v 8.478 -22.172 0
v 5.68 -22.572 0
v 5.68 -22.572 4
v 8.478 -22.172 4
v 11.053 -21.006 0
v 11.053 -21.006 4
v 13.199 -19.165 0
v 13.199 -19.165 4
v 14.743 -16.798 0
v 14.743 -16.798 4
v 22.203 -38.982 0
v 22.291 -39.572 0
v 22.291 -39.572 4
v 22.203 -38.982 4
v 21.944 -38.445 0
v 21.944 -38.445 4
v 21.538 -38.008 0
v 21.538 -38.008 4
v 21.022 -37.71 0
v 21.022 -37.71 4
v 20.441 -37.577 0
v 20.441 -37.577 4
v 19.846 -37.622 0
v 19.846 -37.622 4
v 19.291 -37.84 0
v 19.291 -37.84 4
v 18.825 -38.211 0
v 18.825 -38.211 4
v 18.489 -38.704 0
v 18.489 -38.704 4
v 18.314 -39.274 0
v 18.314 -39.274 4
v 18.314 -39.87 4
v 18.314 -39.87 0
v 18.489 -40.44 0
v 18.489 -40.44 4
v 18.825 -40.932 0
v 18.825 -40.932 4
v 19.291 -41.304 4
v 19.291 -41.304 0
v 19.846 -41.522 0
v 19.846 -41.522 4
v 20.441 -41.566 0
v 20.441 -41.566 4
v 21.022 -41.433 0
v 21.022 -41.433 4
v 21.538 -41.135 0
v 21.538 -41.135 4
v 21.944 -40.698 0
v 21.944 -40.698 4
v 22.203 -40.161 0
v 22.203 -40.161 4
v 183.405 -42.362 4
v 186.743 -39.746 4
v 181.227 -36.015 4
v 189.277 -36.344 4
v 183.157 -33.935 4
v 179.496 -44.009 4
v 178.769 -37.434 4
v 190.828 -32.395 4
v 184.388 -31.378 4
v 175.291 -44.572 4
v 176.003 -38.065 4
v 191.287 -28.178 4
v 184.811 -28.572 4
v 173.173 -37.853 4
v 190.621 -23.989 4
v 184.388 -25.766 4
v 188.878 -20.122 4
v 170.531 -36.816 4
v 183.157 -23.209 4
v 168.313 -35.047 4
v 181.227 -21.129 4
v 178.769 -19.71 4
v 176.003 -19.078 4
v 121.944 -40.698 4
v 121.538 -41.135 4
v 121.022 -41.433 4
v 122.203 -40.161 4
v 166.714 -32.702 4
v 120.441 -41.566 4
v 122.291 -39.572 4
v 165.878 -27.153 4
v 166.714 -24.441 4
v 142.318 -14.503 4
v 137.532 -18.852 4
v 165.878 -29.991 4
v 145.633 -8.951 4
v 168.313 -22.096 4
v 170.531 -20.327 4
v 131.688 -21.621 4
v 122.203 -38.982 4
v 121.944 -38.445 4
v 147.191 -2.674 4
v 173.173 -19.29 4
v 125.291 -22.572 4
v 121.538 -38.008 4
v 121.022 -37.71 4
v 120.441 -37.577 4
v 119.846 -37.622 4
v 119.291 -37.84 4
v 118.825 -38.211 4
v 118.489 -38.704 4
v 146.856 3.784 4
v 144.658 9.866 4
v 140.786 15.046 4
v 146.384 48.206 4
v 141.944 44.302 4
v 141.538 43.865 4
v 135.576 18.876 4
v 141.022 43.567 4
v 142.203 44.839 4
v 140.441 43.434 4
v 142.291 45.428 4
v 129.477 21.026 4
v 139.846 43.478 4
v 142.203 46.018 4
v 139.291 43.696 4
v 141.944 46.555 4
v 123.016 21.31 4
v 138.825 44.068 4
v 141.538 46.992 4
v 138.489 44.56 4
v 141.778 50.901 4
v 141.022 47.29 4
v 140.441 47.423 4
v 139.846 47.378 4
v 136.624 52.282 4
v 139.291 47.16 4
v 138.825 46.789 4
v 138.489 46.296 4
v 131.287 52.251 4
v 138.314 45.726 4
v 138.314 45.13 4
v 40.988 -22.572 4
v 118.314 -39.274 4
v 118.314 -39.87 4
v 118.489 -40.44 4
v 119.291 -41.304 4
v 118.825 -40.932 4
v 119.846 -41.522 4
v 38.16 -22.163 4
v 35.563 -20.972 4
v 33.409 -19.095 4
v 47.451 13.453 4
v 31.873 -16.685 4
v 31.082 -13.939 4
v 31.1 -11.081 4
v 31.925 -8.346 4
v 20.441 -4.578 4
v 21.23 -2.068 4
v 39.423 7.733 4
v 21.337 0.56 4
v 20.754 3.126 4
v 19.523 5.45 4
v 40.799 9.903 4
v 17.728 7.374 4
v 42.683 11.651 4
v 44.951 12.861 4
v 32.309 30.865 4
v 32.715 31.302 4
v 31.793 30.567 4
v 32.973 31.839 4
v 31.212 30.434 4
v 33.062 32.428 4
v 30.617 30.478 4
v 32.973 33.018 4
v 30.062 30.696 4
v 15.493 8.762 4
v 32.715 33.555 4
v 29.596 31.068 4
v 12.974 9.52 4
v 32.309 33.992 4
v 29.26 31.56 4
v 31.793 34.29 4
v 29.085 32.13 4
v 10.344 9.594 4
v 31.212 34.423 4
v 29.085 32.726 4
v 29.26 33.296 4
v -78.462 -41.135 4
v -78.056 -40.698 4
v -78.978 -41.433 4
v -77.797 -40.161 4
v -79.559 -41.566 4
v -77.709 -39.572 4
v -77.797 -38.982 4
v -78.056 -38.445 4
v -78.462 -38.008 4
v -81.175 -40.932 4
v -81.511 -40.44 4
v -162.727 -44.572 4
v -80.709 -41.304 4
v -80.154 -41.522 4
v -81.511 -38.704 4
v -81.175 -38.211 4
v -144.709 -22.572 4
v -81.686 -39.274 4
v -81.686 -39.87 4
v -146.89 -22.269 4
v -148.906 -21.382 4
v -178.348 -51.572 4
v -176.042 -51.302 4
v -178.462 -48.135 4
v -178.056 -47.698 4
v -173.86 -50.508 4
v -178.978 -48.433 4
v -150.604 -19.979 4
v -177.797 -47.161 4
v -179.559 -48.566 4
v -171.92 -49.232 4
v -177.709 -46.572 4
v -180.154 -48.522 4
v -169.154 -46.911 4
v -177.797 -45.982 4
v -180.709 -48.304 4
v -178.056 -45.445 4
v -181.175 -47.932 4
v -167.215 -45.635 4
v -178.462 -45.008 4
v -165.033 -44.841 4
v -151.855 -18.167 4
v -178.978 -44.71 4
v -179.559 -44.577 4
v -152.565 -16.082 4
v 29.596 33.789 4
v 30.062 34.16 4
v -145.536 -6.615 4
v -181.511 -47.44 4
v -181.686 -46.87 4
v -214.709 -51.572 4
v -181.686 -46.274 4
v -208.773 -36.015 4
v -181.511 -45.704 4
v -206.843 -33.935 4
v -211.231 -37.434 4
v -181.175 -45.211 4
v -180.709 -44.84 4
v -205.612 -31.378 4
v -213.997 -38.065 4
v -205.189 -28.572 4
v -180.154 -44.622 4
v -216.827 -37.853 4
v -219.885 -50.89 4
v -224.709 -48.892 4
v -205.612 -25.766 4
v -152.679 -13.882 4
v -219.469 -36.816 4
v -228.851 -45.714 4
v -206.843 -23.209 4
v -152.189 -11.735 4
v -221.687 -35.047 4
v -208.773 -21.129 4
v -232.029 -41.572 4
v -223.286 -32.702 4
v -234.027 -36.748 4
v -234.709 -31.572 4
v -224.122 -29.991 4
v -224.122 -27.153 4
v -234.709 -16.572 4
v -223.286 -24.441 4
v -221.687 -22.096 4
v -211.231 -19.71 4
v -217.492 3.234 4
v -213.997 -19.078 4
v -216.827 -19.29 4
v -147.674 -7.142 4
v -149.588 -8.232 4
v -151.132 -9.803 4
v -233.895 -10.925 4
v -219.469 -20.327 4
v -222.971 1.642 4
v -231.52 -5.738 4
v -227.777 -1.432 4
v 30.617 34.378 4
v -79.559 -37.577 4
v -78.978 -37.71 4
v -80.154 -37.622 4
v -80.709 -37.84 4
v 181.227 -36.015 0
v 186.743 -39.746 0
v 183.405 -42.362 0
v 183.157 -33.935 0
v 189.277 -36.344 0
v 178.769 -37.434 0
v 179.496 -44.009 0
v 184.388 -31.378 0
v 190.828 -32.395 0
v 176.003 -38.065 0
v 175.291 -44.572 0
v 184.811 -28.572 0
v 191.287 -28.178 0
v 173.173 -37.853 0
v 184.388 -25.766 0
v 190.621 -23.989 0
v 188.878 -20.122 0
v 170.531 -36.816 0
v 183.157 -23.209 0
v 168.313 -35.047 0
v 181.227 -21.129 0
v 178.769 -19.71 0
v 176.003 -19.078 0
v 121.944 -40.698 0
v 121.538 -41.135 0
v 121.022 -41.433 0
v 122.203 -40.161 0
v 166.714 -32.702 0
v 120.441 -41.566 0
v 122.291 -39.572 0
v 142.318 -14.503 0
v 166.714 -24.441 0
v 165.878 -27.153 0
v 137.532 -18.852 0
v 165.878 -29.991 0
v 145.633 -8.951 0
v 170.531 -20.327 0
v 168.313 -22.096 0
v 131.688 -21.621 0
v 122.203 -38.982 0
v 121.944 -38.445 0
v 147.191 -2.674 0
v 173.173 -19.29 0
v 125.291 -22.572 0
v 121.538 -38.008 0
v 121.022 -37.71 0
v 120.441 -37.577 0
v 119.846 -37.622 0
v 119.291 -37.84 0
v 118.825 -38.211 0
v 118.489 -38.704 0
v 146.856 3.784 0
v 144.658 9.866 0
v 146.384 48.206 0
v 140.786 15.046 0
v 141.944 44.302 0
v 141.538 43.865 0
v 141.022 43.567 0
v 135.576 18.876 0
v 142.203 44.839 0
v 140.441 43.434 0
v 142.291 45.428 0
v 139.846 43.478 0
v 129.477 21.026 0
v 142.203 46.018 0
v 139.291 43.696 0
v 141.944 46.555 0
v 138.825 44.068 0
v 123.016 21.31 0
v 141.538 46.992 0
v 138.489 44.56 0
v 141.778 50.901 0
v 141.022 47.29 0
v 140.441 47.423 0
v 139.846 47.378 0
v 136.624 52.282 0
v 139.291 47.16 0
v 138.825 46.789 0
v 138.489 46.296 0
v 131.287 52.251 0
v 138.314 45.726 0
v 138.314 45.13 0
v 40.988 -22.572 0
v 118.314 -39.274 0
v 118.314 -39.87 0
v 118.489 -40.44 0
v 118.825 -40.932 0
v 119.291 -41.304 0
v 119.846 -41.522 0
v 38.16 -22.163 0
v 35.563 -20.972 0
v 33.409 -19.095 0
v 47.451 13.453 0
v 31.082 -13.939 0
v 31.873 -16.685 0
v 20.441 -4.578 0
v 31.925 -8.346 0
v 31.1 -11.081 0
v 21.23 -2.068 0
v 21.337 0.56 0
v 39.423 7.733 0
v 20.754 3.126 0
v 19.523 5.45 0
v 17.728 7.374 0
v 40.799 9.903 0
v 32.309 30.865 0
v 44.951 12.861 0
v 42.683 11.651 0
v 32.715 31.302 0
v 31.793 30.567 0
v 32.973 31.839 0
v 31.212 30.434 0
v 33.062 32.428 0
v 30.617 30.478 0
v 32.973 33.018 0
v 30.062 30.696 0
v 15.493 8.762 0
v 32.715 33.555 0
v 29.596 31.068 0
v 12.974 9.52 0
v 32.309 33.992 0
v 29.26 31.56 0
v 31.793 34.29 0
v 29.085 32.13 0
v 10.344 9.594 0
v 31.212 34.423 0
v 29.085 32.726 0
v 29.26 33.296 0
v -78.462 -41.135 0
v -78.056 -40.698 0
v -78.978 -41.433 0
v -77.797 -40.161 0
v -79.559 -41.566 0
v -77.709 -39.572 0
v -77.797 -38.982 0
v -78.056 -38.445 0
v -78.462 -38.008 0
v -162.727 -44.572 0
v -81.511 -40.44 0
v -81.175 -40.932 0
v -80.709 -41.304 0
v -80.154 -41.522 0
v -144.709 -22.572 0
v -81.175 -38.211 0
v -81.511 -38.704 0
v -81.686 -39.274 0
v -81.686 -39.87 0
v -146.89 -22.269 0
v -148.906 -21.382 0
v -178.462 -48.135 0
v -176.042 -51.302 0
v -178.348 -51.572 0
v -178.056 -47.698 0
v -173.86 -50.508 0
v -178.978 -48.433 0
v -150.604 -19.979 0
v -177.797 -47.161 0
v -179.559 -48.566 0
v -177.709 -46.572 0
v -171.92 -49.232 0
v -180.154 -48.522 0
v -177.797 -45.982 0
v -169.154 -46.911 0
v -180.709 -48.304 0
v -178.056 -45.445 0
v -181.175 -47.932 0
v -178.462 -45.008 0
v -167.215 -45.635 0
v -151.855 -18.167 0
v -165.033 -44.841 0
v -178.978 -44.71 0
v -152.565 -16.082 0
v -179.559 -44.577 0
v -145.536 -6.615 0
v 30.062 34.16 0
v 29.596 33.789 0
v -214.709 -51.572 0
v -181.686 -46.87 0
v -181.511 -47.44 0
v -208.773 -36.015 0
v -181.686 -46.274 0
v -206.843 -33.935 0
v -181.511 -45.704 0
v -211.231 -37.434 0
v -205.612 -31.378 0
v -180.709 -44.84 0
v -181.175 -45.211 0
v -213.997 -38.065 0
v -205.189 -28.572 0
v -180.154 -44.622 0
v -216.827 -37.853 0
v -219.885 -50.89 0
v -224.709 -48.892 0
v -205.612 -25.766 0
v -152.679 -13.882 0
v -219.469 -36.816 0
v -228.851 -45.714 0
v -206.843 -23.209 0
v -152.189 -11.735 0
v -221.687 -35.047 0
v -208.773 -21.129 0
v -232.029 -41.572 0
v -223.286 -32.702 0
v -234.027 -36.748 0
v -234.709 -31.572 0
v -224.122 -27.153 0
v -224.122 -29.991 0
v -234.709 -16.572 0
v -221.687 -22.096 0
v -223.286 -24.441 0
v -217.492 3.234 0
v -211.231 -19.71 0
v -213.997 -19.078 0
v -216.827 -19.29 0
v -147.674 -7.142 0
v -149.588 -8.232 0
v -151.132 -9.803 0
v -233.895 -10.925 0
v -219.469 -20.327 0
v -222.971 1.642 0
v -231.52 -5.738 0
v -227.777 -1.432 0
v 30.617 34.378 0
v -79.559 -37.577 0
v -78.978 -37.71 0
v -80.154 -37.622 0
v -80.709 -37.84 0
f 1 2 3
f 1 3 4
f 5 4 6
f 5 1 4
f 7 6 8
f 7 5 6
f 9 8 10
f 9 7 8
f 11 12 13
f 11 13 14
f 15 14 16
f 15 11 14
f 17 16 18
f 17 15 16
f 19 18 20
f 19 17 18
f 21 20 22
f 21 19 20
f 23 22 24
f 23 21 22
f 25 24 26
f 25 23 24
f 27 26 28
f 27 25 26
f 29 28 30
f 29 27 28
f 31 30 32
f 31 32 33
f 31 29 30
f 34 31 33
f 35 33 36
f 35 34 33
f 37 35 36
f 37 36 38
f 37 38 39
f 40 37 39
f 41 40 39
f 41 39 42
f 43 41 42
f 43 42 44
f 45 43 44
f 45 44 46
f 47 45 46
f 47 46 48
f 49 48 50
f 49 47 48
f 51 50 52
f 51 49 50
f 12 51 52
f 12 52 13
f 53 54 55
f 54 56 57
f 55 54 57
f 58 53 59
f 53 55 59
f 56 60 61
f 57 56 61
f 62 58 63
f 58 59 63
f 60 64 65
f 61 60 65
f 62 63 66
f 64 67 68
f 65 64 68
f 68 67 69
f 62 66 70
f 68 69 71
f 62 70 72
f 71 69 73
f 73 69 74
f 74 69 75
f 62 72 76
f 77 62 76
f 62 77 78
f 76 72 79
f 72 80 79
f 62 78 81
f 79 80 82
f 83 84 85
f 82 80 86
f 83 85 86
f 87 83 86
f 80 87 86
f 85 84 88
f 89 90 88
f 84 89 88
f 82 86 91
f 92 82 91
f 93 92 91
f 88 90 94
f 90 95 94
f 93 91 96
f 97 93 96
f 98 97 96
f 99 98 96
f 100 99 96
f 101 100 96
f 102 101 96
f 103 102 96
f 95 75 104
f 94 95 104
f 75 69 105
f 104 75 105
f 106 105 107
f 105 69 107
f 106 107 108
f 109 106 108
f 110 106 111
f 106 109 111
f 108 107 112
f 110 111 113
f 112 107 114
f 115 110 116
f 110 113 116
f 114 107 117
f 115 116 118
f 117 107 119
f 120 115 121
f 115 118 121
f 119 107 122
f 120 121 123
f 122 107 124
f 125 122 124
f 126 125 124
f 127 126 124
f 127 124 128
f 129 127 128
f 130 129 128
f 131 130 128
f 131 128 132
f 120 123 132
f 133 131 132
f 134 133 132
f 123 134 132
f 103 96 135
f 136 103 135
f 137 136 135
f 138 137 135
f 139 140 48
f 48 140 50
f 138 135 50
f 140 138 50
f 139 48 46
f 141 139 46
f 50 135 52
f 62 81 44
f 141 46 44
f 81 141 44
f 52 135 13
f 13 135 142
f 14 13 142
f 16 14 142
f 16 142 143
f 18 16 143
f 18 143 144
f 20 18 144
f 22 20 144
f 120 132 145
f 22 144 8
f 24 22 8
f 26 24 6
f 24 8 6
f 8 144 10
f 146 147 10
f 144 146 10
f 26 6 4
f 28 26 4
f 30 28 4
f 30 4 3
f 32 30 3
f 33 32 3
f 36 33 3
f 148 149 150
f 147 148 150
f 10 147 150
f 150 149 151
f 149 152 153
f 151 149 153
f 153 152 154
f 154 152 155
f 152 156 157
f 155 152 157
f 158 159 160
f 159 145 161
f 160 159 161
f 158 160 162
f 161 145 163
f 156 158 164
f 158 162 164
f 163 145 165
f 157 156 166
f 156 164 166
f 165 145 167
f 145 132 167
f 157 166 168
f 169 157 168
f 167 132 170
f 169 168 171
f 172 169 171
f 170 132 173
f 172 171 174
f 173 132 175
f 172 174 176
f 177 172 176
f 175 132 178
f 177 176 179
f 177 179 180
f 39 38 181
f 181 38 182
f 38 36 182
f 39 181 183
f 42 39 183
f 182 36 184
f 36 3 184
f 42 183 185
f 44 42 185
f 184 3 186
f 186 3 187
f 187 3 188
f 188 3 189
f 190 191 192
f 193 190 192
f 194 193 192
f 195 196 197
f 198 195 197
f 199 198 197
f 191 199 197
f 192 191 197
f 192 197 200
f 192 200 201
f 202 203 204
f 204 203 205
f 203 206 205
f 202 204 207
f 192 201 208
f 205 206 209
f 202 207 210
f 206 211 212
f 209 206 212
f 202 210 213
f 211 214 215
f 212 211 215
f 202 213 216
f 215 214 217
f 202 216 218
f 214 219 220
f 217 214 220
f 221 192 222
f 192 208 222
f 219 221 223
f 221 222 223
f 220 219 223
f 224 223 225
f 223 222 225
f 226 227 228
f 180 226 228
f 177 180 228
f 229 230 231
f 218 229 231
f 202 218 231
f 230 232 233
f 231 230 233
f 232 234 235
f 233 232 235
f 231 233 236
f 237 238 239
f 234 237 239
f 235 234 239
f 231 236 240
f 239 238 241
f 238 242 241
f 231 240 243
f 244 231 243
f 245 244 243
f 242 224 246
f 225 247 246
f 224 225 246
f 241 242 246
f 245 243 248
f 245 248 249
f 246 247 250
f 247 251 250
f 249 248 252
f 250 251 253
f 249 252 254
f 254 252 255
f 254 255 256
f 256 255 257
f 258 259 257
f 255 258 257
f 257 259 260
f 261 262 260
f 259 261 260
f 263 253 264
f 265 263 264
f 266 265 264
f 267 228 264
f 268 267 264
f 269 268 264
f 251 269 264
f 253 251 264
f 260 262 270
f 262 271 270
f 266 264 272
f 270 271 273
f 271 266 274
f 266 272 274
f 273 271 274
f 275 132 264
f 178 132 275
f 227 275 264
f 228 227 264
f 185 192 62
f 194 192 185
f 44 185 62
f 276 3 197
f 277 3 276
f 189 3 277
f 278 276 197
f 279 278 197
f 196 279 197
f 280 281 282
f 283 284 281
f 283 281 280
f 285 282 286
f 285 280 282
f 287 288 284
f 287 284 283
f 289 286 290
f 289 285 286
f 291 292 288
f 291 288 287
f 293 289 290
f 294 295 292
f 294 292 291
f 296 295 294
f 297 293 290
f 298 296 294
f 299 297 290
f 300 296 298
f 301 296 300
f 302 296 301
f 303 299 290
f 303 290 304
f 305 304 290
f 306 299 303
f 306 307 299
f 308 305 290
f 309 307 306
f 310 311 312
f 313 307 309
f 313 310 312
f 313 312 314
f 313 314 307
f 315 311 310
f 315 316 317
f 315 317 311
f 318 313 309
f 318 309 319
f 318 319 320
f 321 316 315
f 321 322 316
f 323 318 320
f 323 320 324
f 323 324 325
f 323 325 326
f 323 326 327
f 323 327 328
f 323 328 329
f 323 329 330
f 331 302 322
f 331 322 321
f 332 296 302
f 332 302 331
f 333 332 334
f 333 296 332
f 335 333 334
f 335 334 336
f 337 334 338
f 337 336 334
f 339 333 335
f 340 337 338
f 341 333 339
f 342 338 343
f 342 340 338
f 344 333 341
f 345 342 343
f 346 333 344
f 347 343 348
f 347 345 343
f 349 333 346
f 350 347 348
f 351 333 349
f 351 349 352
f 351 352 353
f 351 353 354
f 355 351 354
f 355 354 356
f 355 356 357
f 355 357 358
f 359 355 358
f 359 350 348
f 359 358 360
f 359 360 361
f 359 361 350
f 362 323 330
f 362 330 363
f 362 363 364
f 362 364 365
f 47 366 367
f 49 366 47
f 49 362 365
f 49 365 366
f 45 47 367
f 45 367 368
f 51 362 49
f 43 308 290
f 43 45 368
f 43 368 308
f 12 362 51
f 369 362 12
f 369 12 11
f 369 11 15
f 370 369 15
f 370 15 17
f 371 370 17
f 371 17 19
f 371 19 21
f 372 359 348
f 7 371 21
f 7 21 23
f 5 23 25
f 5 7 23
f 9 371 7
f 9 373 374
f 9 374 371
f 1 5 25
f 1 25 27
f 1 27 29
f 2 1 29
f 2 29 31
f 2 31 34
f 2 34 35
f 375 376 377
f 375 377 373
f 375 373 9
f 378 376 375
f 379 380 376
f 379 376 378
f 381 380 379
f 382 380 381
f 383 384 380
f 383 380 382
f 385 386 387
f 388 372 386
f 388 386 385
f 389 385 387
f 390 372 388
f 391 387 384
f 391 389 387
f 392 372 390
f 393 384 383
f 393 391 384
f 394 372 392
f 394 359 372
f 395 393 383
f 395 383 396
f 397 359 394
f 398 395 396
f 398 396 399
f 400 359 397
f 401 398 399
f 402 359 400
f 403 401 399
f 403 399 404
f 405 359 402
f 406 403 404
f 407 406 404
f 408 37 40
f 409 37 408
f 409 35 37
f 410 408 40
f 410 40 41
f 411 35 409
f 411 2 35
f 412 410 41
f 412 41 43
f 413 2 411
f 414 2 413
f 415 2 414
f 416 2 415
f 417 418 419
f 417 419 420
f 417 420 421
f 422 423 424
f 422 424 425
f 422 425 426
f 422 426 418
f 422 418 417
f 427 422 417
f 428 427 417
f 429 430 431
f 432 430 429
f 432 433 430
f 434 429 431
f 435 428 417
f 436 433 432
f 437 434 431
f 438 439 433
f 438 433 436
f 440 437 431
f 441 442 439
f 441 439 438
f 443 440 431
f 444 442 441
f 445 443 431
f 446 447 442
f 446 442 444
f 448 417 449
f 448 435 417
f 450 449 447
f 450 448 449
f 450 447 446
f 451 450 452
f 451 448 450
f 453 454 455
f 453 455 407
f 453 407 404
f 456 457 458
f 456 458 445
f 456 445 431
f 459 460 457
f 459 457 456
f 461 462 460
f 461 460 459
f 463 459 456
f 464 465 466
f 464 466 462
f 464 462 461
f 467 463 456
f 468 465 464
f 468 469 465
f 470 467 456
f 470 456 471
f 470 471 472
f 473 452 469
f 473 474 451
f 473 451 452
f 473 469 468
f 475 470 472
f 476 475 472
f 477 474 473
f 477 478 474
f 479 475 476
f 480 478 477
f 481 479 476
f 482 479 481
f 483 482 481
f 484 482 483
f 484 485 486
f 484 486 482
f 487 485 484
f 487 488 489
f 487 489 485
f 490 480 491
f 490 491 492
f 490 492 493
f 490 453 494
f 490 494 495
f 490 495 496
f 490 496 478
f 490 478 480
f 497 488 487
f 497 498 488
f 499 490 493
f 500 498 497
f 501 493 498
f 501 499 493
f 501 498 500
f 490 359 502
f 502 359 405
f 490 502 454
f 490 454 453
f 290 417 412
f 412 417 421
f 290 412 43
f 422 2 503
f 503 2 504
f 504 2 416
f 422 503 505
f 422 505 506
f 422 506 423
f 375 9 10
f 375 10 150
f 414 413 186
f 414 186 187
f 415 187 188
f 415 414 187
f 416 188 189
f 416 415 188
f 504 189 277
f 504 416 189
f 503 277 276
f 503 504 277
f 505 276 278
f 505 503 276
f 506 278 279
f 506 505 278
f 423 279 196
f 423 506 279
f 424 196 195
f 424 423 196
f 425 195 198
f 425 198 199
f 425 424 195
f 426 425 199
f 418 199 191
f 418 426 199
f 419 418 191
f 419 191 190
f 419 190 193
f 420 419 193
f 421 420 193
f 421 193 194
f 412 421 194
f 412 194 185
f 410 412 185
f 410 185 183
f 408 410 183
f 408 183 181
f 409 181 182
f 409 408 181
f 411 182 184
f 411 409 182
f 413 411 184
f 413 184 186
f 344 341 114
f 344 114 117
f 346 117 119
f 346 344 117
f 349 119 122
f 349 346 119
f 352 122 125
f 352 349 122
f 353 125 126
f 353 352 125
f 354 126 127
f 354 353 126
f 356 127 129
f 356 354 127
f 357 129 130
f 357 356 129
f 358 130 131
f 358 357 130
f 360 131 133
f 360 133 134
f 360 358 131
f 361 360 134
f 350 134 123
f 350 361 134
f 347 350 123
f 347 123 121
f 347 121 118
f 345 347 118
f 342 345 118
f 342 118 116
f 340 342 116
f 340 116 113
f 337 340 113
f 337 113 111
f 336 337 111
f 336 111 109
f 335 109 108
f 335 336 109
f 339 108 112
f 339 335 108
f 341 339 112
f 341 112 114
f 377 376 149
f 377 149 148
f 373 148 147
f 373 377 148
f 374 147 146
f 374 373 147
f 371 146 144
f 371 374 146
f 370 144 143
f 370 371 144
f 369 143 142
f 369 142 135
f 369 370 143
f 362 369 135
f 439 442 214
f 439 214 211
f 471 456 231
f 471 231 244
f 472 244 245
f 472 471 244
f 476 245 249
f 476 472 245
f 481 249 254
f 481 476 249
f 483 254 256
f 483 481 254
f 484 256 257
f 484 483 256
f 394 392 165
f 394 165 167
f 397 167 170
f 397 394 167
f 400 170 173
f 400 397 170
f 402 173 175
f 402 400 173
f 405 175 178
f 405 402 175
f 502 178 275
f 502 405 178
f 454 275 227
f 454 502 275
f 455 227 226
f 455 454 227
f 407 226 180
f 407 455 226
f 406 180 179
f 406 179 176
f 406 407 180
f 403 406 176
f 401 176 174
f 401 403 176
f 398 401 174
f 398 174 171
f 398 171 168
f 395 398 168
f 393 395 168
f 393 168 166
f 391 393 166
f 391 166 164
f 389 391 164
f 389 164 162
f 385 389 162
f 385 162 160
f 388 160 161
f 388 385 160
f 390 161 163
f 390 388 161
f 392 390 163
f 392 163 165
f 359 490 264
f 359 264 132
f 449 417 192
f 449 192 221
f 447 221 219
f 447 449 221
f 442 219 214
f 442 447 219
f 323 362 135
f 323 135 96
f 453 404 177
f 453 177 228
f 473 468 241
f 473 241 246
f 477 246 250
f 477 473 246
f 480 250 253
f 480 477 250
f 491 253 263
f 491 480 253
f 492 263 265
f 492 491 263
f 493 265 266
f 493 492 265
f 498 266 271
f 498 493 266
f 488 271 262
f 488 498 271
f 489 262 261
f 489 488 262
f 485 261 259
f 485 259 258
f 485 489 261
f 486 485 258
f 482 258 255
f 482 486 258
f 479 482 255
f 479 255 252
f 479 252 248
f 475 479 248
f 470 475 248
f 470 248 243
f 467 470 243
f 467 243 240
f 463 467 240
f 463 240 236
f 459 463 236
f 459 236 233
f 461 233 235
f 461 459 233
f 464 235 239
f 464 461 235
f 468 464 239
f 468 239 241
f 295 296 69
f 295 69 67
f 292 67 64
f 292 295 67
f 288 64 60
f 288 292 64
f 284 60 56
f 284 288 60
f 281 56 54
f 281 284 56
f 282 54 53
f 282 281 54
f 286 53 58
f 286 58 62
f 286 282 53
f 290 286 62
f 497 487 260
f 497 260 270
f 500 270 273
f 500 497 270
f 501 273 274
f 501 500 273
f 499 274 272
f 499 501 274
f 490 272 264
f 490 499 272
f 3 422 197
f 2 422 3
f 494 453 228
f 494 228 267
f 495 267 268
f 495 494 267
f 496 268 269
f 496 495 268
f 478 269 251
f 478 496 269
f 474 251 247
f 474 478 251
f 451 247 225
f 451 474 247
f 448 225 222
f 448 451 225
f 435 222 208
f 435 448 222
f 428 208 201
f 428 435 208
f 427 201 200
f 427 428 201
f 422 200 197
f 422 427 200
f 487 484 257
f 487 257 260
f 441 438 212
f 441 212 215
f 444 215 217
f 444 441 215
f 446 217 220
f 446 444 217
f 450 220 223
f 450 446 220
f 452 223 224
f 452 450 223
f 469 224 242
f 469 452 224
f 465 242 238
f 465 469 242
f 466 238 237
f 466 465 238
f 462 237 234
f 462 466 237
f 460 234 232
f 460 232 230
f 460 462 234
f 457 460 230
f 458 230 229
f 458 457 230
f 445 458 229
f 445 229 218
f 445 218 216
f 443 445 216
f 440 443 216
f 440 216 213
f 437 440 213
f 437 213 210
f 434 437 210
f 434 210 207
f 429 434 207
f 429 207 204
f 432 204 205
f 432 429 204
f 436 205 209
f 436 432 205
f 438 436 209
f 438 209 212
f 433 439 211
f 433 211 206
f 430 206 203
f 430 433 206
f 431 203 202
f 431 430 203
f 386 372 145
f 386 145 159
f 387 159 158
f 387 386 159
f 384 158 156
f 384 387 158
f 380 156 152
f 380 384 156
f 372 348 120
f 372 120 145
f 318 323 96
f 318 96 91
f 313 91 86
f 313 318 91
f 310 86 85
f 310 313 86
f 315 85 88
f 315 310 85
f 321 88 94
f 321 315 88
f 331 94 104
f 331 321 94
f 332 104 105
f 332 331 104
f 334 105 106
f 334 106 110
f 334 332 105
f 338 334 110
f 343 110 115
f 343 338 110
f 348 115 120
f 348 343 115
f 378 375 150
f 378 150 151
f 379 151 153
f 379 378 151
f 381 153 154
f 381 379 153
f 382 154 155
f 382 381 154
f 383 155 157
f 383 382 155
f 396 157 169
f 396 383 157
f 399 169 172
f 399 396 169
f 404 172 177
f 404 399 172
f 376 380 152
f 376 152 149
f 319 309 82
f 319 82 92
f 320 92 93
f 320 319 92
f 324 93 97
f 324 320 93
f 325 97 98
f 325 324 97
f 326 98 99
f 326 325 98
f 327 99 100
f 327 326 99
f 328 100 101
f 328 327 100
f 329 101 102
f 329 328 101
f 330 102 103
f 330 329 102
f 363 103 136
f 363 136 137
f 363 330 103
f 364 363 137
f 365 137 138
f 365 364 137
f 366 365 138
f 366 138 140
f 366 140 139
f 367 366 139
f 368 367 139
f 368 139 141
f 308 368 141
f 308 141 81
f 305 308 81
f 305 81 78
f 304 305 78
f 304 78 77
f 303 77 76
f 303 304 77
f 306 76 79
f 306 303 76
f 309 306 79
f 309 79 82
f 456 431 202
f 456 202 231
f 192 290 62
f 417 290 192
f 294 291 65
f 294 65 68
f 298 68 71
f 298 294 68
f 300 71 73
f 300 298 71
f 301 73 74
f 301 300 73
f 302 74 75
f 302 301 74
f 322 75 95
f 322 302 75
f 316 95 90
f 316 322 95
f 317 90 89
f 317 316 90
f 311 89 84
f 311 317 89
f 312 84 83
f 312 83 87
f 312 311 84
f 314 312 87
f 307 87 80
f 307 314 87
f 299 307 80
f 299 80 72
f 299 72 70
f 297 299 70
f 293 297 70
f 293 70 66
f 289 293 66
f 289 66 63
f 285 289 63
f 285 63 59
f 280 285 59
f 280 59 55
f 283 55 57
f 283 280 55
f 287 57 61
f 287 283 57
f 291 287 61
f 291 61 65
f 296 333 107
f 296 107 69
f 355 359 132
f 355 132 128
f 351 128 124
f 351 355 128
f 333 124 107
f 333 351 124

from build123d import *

# Parameters (mm, degrees)
SKETCH_1_R      = 2
SKETCH_1_R_2    = 9.52
EXTRUDE_1_DEPTH = 4


with BuildPart() as part:
    # 草图1 → 凸台-拉伸1 (new body)
    with BuildSketch(Plane.XY):
        with BuildLine():
            Line((-217.492033448, 3.233624406), (131.287449442, 52.251384058))
            ThreePointArc((131.287449442, 52.251384058), (139.247292364, 51.764539209), (146.384140968, 48.206237756))
            Line((146.384140968, 48.206237756), (188.878227524, -20.121950331))
            ThreePointArc((188.878227524, -20.121950331), (189.277074538, -36.343590473), (175.291428571, -44.571736969))
            Line((175.291428571, -44.571736969), (-162.726593938, -44.571736969))
            ThreePointArc((-162.726593938, -44.571736969), (-166.146795371, -45.174810761), (-169.154470035, -46.911292538))
            Line((-169.154470035, -46.911292538), (-171.920397674, -49.2321814))
            ThreePointArc((-171.920397674, -49.2321814), (-174.928072338, -50.968663177), (-178.348273771, -51.571736969))
            Line((-178.348273771, -51.571736969), (-214.708571429, -51.571736969))
            ThreePointArc((-214.708571429, -51.571736969), (-228.850707052, -45.713872593), (-234.708571429, -31.571736969))
            Line((-234.708571429, -31.571736969), (-234.708571429, -16.571736969))
            ThreePointArc((-234.708571429, -16.571736969), (-229.802763033, -3.450556389), (-217.492033448, 3.233624406))
        make_face()
        with Locations((120.291428571, -39.571736969)):
            Circle(SKETCH_1_R, mode=Mode.SUBTRACT)
        with Locations((31.062311574, 32.428263031)):
            Circle(SKETCH_1_R, mode=Mode.SUBTRACT)
        with Locations((175.291428571, -28.571736969)):
            Circle(SKETCH_1_R_2, mode=Mode.SUBTRACT)
        with Locations((-79.708571429, -39.571736969)):
            Circle(SKETCH_1_R, mode=Mode.SUBTRACT)
        with Locations((-214.708571429, -28.571736969)):
            Circle(SKETCH_1_R_2, mode=Mode.SUBTRACT)
        with Locations((140.291428571, 45.428263031)):
            Circle(SKETCH_1_R, mode=Mode.SUBTRACT)
        with Locations((-179.708571429, -46.571736969)):
            Circle(SKETCH_1_R, mode=Mode.SUBTRACT)
        with Locations((20.291428571, -39.571736969)):
            Circle(SKETCH_1_R, mode=Mode.SUBTRACT)
        with BuildLine():
            Line((40.988284343, -22.571736969), (125.291428571, -22.571736969))
            ThreePointArc((125.291428571, -22.571736969), (147.261913315, 0.567473351), (123.016064666, 21.310281199))
            Line((123.016064666, 21.310281199), (47.451409263, 13.452820882))
            ThreePointArc((47.451409263, 13.452820882), (42.683150544, 11.650822458), (39.422587713, 7.732631605))
            Line((39.422587713, 7.732631605), (31.925206472, -8.345554352))
            ThreePointArc((31.925206472, -8.345554352), (32.554369884, -17.944733053), (40.988284343, -22.571736969))
        make_face(mode=Mode.SUBTRACT)
        with BuildLine():
            Line((-144.708571429, -22.571736969), (5.680190936, -22.571736969))
            ThreePointArc((5.680190936, -22.571736969), (11.053187019, -21.005651427), (14.743268806, -16.797919586))
            Line((14.743268806, -16.797919586), (20.441380932, -4.578278698))
            ThreePointArc((20.441380932, -4.578278698), (19.522676532, 5.450418959), (10.344046742, 9.594275814))
            Line((10.344046742, 9.594275814), (-145.535976485, -6.614639453))
            ThreePointArc((-145.535976485, -6.614639453), (-152.697838608, -14.985995267), (-144.708571429, -22.571736969))
        make_face(mode=Mode.SUBTRACT)
    extrude(amount=EXTRUDE_1_DEPTH)


solid = part.part
